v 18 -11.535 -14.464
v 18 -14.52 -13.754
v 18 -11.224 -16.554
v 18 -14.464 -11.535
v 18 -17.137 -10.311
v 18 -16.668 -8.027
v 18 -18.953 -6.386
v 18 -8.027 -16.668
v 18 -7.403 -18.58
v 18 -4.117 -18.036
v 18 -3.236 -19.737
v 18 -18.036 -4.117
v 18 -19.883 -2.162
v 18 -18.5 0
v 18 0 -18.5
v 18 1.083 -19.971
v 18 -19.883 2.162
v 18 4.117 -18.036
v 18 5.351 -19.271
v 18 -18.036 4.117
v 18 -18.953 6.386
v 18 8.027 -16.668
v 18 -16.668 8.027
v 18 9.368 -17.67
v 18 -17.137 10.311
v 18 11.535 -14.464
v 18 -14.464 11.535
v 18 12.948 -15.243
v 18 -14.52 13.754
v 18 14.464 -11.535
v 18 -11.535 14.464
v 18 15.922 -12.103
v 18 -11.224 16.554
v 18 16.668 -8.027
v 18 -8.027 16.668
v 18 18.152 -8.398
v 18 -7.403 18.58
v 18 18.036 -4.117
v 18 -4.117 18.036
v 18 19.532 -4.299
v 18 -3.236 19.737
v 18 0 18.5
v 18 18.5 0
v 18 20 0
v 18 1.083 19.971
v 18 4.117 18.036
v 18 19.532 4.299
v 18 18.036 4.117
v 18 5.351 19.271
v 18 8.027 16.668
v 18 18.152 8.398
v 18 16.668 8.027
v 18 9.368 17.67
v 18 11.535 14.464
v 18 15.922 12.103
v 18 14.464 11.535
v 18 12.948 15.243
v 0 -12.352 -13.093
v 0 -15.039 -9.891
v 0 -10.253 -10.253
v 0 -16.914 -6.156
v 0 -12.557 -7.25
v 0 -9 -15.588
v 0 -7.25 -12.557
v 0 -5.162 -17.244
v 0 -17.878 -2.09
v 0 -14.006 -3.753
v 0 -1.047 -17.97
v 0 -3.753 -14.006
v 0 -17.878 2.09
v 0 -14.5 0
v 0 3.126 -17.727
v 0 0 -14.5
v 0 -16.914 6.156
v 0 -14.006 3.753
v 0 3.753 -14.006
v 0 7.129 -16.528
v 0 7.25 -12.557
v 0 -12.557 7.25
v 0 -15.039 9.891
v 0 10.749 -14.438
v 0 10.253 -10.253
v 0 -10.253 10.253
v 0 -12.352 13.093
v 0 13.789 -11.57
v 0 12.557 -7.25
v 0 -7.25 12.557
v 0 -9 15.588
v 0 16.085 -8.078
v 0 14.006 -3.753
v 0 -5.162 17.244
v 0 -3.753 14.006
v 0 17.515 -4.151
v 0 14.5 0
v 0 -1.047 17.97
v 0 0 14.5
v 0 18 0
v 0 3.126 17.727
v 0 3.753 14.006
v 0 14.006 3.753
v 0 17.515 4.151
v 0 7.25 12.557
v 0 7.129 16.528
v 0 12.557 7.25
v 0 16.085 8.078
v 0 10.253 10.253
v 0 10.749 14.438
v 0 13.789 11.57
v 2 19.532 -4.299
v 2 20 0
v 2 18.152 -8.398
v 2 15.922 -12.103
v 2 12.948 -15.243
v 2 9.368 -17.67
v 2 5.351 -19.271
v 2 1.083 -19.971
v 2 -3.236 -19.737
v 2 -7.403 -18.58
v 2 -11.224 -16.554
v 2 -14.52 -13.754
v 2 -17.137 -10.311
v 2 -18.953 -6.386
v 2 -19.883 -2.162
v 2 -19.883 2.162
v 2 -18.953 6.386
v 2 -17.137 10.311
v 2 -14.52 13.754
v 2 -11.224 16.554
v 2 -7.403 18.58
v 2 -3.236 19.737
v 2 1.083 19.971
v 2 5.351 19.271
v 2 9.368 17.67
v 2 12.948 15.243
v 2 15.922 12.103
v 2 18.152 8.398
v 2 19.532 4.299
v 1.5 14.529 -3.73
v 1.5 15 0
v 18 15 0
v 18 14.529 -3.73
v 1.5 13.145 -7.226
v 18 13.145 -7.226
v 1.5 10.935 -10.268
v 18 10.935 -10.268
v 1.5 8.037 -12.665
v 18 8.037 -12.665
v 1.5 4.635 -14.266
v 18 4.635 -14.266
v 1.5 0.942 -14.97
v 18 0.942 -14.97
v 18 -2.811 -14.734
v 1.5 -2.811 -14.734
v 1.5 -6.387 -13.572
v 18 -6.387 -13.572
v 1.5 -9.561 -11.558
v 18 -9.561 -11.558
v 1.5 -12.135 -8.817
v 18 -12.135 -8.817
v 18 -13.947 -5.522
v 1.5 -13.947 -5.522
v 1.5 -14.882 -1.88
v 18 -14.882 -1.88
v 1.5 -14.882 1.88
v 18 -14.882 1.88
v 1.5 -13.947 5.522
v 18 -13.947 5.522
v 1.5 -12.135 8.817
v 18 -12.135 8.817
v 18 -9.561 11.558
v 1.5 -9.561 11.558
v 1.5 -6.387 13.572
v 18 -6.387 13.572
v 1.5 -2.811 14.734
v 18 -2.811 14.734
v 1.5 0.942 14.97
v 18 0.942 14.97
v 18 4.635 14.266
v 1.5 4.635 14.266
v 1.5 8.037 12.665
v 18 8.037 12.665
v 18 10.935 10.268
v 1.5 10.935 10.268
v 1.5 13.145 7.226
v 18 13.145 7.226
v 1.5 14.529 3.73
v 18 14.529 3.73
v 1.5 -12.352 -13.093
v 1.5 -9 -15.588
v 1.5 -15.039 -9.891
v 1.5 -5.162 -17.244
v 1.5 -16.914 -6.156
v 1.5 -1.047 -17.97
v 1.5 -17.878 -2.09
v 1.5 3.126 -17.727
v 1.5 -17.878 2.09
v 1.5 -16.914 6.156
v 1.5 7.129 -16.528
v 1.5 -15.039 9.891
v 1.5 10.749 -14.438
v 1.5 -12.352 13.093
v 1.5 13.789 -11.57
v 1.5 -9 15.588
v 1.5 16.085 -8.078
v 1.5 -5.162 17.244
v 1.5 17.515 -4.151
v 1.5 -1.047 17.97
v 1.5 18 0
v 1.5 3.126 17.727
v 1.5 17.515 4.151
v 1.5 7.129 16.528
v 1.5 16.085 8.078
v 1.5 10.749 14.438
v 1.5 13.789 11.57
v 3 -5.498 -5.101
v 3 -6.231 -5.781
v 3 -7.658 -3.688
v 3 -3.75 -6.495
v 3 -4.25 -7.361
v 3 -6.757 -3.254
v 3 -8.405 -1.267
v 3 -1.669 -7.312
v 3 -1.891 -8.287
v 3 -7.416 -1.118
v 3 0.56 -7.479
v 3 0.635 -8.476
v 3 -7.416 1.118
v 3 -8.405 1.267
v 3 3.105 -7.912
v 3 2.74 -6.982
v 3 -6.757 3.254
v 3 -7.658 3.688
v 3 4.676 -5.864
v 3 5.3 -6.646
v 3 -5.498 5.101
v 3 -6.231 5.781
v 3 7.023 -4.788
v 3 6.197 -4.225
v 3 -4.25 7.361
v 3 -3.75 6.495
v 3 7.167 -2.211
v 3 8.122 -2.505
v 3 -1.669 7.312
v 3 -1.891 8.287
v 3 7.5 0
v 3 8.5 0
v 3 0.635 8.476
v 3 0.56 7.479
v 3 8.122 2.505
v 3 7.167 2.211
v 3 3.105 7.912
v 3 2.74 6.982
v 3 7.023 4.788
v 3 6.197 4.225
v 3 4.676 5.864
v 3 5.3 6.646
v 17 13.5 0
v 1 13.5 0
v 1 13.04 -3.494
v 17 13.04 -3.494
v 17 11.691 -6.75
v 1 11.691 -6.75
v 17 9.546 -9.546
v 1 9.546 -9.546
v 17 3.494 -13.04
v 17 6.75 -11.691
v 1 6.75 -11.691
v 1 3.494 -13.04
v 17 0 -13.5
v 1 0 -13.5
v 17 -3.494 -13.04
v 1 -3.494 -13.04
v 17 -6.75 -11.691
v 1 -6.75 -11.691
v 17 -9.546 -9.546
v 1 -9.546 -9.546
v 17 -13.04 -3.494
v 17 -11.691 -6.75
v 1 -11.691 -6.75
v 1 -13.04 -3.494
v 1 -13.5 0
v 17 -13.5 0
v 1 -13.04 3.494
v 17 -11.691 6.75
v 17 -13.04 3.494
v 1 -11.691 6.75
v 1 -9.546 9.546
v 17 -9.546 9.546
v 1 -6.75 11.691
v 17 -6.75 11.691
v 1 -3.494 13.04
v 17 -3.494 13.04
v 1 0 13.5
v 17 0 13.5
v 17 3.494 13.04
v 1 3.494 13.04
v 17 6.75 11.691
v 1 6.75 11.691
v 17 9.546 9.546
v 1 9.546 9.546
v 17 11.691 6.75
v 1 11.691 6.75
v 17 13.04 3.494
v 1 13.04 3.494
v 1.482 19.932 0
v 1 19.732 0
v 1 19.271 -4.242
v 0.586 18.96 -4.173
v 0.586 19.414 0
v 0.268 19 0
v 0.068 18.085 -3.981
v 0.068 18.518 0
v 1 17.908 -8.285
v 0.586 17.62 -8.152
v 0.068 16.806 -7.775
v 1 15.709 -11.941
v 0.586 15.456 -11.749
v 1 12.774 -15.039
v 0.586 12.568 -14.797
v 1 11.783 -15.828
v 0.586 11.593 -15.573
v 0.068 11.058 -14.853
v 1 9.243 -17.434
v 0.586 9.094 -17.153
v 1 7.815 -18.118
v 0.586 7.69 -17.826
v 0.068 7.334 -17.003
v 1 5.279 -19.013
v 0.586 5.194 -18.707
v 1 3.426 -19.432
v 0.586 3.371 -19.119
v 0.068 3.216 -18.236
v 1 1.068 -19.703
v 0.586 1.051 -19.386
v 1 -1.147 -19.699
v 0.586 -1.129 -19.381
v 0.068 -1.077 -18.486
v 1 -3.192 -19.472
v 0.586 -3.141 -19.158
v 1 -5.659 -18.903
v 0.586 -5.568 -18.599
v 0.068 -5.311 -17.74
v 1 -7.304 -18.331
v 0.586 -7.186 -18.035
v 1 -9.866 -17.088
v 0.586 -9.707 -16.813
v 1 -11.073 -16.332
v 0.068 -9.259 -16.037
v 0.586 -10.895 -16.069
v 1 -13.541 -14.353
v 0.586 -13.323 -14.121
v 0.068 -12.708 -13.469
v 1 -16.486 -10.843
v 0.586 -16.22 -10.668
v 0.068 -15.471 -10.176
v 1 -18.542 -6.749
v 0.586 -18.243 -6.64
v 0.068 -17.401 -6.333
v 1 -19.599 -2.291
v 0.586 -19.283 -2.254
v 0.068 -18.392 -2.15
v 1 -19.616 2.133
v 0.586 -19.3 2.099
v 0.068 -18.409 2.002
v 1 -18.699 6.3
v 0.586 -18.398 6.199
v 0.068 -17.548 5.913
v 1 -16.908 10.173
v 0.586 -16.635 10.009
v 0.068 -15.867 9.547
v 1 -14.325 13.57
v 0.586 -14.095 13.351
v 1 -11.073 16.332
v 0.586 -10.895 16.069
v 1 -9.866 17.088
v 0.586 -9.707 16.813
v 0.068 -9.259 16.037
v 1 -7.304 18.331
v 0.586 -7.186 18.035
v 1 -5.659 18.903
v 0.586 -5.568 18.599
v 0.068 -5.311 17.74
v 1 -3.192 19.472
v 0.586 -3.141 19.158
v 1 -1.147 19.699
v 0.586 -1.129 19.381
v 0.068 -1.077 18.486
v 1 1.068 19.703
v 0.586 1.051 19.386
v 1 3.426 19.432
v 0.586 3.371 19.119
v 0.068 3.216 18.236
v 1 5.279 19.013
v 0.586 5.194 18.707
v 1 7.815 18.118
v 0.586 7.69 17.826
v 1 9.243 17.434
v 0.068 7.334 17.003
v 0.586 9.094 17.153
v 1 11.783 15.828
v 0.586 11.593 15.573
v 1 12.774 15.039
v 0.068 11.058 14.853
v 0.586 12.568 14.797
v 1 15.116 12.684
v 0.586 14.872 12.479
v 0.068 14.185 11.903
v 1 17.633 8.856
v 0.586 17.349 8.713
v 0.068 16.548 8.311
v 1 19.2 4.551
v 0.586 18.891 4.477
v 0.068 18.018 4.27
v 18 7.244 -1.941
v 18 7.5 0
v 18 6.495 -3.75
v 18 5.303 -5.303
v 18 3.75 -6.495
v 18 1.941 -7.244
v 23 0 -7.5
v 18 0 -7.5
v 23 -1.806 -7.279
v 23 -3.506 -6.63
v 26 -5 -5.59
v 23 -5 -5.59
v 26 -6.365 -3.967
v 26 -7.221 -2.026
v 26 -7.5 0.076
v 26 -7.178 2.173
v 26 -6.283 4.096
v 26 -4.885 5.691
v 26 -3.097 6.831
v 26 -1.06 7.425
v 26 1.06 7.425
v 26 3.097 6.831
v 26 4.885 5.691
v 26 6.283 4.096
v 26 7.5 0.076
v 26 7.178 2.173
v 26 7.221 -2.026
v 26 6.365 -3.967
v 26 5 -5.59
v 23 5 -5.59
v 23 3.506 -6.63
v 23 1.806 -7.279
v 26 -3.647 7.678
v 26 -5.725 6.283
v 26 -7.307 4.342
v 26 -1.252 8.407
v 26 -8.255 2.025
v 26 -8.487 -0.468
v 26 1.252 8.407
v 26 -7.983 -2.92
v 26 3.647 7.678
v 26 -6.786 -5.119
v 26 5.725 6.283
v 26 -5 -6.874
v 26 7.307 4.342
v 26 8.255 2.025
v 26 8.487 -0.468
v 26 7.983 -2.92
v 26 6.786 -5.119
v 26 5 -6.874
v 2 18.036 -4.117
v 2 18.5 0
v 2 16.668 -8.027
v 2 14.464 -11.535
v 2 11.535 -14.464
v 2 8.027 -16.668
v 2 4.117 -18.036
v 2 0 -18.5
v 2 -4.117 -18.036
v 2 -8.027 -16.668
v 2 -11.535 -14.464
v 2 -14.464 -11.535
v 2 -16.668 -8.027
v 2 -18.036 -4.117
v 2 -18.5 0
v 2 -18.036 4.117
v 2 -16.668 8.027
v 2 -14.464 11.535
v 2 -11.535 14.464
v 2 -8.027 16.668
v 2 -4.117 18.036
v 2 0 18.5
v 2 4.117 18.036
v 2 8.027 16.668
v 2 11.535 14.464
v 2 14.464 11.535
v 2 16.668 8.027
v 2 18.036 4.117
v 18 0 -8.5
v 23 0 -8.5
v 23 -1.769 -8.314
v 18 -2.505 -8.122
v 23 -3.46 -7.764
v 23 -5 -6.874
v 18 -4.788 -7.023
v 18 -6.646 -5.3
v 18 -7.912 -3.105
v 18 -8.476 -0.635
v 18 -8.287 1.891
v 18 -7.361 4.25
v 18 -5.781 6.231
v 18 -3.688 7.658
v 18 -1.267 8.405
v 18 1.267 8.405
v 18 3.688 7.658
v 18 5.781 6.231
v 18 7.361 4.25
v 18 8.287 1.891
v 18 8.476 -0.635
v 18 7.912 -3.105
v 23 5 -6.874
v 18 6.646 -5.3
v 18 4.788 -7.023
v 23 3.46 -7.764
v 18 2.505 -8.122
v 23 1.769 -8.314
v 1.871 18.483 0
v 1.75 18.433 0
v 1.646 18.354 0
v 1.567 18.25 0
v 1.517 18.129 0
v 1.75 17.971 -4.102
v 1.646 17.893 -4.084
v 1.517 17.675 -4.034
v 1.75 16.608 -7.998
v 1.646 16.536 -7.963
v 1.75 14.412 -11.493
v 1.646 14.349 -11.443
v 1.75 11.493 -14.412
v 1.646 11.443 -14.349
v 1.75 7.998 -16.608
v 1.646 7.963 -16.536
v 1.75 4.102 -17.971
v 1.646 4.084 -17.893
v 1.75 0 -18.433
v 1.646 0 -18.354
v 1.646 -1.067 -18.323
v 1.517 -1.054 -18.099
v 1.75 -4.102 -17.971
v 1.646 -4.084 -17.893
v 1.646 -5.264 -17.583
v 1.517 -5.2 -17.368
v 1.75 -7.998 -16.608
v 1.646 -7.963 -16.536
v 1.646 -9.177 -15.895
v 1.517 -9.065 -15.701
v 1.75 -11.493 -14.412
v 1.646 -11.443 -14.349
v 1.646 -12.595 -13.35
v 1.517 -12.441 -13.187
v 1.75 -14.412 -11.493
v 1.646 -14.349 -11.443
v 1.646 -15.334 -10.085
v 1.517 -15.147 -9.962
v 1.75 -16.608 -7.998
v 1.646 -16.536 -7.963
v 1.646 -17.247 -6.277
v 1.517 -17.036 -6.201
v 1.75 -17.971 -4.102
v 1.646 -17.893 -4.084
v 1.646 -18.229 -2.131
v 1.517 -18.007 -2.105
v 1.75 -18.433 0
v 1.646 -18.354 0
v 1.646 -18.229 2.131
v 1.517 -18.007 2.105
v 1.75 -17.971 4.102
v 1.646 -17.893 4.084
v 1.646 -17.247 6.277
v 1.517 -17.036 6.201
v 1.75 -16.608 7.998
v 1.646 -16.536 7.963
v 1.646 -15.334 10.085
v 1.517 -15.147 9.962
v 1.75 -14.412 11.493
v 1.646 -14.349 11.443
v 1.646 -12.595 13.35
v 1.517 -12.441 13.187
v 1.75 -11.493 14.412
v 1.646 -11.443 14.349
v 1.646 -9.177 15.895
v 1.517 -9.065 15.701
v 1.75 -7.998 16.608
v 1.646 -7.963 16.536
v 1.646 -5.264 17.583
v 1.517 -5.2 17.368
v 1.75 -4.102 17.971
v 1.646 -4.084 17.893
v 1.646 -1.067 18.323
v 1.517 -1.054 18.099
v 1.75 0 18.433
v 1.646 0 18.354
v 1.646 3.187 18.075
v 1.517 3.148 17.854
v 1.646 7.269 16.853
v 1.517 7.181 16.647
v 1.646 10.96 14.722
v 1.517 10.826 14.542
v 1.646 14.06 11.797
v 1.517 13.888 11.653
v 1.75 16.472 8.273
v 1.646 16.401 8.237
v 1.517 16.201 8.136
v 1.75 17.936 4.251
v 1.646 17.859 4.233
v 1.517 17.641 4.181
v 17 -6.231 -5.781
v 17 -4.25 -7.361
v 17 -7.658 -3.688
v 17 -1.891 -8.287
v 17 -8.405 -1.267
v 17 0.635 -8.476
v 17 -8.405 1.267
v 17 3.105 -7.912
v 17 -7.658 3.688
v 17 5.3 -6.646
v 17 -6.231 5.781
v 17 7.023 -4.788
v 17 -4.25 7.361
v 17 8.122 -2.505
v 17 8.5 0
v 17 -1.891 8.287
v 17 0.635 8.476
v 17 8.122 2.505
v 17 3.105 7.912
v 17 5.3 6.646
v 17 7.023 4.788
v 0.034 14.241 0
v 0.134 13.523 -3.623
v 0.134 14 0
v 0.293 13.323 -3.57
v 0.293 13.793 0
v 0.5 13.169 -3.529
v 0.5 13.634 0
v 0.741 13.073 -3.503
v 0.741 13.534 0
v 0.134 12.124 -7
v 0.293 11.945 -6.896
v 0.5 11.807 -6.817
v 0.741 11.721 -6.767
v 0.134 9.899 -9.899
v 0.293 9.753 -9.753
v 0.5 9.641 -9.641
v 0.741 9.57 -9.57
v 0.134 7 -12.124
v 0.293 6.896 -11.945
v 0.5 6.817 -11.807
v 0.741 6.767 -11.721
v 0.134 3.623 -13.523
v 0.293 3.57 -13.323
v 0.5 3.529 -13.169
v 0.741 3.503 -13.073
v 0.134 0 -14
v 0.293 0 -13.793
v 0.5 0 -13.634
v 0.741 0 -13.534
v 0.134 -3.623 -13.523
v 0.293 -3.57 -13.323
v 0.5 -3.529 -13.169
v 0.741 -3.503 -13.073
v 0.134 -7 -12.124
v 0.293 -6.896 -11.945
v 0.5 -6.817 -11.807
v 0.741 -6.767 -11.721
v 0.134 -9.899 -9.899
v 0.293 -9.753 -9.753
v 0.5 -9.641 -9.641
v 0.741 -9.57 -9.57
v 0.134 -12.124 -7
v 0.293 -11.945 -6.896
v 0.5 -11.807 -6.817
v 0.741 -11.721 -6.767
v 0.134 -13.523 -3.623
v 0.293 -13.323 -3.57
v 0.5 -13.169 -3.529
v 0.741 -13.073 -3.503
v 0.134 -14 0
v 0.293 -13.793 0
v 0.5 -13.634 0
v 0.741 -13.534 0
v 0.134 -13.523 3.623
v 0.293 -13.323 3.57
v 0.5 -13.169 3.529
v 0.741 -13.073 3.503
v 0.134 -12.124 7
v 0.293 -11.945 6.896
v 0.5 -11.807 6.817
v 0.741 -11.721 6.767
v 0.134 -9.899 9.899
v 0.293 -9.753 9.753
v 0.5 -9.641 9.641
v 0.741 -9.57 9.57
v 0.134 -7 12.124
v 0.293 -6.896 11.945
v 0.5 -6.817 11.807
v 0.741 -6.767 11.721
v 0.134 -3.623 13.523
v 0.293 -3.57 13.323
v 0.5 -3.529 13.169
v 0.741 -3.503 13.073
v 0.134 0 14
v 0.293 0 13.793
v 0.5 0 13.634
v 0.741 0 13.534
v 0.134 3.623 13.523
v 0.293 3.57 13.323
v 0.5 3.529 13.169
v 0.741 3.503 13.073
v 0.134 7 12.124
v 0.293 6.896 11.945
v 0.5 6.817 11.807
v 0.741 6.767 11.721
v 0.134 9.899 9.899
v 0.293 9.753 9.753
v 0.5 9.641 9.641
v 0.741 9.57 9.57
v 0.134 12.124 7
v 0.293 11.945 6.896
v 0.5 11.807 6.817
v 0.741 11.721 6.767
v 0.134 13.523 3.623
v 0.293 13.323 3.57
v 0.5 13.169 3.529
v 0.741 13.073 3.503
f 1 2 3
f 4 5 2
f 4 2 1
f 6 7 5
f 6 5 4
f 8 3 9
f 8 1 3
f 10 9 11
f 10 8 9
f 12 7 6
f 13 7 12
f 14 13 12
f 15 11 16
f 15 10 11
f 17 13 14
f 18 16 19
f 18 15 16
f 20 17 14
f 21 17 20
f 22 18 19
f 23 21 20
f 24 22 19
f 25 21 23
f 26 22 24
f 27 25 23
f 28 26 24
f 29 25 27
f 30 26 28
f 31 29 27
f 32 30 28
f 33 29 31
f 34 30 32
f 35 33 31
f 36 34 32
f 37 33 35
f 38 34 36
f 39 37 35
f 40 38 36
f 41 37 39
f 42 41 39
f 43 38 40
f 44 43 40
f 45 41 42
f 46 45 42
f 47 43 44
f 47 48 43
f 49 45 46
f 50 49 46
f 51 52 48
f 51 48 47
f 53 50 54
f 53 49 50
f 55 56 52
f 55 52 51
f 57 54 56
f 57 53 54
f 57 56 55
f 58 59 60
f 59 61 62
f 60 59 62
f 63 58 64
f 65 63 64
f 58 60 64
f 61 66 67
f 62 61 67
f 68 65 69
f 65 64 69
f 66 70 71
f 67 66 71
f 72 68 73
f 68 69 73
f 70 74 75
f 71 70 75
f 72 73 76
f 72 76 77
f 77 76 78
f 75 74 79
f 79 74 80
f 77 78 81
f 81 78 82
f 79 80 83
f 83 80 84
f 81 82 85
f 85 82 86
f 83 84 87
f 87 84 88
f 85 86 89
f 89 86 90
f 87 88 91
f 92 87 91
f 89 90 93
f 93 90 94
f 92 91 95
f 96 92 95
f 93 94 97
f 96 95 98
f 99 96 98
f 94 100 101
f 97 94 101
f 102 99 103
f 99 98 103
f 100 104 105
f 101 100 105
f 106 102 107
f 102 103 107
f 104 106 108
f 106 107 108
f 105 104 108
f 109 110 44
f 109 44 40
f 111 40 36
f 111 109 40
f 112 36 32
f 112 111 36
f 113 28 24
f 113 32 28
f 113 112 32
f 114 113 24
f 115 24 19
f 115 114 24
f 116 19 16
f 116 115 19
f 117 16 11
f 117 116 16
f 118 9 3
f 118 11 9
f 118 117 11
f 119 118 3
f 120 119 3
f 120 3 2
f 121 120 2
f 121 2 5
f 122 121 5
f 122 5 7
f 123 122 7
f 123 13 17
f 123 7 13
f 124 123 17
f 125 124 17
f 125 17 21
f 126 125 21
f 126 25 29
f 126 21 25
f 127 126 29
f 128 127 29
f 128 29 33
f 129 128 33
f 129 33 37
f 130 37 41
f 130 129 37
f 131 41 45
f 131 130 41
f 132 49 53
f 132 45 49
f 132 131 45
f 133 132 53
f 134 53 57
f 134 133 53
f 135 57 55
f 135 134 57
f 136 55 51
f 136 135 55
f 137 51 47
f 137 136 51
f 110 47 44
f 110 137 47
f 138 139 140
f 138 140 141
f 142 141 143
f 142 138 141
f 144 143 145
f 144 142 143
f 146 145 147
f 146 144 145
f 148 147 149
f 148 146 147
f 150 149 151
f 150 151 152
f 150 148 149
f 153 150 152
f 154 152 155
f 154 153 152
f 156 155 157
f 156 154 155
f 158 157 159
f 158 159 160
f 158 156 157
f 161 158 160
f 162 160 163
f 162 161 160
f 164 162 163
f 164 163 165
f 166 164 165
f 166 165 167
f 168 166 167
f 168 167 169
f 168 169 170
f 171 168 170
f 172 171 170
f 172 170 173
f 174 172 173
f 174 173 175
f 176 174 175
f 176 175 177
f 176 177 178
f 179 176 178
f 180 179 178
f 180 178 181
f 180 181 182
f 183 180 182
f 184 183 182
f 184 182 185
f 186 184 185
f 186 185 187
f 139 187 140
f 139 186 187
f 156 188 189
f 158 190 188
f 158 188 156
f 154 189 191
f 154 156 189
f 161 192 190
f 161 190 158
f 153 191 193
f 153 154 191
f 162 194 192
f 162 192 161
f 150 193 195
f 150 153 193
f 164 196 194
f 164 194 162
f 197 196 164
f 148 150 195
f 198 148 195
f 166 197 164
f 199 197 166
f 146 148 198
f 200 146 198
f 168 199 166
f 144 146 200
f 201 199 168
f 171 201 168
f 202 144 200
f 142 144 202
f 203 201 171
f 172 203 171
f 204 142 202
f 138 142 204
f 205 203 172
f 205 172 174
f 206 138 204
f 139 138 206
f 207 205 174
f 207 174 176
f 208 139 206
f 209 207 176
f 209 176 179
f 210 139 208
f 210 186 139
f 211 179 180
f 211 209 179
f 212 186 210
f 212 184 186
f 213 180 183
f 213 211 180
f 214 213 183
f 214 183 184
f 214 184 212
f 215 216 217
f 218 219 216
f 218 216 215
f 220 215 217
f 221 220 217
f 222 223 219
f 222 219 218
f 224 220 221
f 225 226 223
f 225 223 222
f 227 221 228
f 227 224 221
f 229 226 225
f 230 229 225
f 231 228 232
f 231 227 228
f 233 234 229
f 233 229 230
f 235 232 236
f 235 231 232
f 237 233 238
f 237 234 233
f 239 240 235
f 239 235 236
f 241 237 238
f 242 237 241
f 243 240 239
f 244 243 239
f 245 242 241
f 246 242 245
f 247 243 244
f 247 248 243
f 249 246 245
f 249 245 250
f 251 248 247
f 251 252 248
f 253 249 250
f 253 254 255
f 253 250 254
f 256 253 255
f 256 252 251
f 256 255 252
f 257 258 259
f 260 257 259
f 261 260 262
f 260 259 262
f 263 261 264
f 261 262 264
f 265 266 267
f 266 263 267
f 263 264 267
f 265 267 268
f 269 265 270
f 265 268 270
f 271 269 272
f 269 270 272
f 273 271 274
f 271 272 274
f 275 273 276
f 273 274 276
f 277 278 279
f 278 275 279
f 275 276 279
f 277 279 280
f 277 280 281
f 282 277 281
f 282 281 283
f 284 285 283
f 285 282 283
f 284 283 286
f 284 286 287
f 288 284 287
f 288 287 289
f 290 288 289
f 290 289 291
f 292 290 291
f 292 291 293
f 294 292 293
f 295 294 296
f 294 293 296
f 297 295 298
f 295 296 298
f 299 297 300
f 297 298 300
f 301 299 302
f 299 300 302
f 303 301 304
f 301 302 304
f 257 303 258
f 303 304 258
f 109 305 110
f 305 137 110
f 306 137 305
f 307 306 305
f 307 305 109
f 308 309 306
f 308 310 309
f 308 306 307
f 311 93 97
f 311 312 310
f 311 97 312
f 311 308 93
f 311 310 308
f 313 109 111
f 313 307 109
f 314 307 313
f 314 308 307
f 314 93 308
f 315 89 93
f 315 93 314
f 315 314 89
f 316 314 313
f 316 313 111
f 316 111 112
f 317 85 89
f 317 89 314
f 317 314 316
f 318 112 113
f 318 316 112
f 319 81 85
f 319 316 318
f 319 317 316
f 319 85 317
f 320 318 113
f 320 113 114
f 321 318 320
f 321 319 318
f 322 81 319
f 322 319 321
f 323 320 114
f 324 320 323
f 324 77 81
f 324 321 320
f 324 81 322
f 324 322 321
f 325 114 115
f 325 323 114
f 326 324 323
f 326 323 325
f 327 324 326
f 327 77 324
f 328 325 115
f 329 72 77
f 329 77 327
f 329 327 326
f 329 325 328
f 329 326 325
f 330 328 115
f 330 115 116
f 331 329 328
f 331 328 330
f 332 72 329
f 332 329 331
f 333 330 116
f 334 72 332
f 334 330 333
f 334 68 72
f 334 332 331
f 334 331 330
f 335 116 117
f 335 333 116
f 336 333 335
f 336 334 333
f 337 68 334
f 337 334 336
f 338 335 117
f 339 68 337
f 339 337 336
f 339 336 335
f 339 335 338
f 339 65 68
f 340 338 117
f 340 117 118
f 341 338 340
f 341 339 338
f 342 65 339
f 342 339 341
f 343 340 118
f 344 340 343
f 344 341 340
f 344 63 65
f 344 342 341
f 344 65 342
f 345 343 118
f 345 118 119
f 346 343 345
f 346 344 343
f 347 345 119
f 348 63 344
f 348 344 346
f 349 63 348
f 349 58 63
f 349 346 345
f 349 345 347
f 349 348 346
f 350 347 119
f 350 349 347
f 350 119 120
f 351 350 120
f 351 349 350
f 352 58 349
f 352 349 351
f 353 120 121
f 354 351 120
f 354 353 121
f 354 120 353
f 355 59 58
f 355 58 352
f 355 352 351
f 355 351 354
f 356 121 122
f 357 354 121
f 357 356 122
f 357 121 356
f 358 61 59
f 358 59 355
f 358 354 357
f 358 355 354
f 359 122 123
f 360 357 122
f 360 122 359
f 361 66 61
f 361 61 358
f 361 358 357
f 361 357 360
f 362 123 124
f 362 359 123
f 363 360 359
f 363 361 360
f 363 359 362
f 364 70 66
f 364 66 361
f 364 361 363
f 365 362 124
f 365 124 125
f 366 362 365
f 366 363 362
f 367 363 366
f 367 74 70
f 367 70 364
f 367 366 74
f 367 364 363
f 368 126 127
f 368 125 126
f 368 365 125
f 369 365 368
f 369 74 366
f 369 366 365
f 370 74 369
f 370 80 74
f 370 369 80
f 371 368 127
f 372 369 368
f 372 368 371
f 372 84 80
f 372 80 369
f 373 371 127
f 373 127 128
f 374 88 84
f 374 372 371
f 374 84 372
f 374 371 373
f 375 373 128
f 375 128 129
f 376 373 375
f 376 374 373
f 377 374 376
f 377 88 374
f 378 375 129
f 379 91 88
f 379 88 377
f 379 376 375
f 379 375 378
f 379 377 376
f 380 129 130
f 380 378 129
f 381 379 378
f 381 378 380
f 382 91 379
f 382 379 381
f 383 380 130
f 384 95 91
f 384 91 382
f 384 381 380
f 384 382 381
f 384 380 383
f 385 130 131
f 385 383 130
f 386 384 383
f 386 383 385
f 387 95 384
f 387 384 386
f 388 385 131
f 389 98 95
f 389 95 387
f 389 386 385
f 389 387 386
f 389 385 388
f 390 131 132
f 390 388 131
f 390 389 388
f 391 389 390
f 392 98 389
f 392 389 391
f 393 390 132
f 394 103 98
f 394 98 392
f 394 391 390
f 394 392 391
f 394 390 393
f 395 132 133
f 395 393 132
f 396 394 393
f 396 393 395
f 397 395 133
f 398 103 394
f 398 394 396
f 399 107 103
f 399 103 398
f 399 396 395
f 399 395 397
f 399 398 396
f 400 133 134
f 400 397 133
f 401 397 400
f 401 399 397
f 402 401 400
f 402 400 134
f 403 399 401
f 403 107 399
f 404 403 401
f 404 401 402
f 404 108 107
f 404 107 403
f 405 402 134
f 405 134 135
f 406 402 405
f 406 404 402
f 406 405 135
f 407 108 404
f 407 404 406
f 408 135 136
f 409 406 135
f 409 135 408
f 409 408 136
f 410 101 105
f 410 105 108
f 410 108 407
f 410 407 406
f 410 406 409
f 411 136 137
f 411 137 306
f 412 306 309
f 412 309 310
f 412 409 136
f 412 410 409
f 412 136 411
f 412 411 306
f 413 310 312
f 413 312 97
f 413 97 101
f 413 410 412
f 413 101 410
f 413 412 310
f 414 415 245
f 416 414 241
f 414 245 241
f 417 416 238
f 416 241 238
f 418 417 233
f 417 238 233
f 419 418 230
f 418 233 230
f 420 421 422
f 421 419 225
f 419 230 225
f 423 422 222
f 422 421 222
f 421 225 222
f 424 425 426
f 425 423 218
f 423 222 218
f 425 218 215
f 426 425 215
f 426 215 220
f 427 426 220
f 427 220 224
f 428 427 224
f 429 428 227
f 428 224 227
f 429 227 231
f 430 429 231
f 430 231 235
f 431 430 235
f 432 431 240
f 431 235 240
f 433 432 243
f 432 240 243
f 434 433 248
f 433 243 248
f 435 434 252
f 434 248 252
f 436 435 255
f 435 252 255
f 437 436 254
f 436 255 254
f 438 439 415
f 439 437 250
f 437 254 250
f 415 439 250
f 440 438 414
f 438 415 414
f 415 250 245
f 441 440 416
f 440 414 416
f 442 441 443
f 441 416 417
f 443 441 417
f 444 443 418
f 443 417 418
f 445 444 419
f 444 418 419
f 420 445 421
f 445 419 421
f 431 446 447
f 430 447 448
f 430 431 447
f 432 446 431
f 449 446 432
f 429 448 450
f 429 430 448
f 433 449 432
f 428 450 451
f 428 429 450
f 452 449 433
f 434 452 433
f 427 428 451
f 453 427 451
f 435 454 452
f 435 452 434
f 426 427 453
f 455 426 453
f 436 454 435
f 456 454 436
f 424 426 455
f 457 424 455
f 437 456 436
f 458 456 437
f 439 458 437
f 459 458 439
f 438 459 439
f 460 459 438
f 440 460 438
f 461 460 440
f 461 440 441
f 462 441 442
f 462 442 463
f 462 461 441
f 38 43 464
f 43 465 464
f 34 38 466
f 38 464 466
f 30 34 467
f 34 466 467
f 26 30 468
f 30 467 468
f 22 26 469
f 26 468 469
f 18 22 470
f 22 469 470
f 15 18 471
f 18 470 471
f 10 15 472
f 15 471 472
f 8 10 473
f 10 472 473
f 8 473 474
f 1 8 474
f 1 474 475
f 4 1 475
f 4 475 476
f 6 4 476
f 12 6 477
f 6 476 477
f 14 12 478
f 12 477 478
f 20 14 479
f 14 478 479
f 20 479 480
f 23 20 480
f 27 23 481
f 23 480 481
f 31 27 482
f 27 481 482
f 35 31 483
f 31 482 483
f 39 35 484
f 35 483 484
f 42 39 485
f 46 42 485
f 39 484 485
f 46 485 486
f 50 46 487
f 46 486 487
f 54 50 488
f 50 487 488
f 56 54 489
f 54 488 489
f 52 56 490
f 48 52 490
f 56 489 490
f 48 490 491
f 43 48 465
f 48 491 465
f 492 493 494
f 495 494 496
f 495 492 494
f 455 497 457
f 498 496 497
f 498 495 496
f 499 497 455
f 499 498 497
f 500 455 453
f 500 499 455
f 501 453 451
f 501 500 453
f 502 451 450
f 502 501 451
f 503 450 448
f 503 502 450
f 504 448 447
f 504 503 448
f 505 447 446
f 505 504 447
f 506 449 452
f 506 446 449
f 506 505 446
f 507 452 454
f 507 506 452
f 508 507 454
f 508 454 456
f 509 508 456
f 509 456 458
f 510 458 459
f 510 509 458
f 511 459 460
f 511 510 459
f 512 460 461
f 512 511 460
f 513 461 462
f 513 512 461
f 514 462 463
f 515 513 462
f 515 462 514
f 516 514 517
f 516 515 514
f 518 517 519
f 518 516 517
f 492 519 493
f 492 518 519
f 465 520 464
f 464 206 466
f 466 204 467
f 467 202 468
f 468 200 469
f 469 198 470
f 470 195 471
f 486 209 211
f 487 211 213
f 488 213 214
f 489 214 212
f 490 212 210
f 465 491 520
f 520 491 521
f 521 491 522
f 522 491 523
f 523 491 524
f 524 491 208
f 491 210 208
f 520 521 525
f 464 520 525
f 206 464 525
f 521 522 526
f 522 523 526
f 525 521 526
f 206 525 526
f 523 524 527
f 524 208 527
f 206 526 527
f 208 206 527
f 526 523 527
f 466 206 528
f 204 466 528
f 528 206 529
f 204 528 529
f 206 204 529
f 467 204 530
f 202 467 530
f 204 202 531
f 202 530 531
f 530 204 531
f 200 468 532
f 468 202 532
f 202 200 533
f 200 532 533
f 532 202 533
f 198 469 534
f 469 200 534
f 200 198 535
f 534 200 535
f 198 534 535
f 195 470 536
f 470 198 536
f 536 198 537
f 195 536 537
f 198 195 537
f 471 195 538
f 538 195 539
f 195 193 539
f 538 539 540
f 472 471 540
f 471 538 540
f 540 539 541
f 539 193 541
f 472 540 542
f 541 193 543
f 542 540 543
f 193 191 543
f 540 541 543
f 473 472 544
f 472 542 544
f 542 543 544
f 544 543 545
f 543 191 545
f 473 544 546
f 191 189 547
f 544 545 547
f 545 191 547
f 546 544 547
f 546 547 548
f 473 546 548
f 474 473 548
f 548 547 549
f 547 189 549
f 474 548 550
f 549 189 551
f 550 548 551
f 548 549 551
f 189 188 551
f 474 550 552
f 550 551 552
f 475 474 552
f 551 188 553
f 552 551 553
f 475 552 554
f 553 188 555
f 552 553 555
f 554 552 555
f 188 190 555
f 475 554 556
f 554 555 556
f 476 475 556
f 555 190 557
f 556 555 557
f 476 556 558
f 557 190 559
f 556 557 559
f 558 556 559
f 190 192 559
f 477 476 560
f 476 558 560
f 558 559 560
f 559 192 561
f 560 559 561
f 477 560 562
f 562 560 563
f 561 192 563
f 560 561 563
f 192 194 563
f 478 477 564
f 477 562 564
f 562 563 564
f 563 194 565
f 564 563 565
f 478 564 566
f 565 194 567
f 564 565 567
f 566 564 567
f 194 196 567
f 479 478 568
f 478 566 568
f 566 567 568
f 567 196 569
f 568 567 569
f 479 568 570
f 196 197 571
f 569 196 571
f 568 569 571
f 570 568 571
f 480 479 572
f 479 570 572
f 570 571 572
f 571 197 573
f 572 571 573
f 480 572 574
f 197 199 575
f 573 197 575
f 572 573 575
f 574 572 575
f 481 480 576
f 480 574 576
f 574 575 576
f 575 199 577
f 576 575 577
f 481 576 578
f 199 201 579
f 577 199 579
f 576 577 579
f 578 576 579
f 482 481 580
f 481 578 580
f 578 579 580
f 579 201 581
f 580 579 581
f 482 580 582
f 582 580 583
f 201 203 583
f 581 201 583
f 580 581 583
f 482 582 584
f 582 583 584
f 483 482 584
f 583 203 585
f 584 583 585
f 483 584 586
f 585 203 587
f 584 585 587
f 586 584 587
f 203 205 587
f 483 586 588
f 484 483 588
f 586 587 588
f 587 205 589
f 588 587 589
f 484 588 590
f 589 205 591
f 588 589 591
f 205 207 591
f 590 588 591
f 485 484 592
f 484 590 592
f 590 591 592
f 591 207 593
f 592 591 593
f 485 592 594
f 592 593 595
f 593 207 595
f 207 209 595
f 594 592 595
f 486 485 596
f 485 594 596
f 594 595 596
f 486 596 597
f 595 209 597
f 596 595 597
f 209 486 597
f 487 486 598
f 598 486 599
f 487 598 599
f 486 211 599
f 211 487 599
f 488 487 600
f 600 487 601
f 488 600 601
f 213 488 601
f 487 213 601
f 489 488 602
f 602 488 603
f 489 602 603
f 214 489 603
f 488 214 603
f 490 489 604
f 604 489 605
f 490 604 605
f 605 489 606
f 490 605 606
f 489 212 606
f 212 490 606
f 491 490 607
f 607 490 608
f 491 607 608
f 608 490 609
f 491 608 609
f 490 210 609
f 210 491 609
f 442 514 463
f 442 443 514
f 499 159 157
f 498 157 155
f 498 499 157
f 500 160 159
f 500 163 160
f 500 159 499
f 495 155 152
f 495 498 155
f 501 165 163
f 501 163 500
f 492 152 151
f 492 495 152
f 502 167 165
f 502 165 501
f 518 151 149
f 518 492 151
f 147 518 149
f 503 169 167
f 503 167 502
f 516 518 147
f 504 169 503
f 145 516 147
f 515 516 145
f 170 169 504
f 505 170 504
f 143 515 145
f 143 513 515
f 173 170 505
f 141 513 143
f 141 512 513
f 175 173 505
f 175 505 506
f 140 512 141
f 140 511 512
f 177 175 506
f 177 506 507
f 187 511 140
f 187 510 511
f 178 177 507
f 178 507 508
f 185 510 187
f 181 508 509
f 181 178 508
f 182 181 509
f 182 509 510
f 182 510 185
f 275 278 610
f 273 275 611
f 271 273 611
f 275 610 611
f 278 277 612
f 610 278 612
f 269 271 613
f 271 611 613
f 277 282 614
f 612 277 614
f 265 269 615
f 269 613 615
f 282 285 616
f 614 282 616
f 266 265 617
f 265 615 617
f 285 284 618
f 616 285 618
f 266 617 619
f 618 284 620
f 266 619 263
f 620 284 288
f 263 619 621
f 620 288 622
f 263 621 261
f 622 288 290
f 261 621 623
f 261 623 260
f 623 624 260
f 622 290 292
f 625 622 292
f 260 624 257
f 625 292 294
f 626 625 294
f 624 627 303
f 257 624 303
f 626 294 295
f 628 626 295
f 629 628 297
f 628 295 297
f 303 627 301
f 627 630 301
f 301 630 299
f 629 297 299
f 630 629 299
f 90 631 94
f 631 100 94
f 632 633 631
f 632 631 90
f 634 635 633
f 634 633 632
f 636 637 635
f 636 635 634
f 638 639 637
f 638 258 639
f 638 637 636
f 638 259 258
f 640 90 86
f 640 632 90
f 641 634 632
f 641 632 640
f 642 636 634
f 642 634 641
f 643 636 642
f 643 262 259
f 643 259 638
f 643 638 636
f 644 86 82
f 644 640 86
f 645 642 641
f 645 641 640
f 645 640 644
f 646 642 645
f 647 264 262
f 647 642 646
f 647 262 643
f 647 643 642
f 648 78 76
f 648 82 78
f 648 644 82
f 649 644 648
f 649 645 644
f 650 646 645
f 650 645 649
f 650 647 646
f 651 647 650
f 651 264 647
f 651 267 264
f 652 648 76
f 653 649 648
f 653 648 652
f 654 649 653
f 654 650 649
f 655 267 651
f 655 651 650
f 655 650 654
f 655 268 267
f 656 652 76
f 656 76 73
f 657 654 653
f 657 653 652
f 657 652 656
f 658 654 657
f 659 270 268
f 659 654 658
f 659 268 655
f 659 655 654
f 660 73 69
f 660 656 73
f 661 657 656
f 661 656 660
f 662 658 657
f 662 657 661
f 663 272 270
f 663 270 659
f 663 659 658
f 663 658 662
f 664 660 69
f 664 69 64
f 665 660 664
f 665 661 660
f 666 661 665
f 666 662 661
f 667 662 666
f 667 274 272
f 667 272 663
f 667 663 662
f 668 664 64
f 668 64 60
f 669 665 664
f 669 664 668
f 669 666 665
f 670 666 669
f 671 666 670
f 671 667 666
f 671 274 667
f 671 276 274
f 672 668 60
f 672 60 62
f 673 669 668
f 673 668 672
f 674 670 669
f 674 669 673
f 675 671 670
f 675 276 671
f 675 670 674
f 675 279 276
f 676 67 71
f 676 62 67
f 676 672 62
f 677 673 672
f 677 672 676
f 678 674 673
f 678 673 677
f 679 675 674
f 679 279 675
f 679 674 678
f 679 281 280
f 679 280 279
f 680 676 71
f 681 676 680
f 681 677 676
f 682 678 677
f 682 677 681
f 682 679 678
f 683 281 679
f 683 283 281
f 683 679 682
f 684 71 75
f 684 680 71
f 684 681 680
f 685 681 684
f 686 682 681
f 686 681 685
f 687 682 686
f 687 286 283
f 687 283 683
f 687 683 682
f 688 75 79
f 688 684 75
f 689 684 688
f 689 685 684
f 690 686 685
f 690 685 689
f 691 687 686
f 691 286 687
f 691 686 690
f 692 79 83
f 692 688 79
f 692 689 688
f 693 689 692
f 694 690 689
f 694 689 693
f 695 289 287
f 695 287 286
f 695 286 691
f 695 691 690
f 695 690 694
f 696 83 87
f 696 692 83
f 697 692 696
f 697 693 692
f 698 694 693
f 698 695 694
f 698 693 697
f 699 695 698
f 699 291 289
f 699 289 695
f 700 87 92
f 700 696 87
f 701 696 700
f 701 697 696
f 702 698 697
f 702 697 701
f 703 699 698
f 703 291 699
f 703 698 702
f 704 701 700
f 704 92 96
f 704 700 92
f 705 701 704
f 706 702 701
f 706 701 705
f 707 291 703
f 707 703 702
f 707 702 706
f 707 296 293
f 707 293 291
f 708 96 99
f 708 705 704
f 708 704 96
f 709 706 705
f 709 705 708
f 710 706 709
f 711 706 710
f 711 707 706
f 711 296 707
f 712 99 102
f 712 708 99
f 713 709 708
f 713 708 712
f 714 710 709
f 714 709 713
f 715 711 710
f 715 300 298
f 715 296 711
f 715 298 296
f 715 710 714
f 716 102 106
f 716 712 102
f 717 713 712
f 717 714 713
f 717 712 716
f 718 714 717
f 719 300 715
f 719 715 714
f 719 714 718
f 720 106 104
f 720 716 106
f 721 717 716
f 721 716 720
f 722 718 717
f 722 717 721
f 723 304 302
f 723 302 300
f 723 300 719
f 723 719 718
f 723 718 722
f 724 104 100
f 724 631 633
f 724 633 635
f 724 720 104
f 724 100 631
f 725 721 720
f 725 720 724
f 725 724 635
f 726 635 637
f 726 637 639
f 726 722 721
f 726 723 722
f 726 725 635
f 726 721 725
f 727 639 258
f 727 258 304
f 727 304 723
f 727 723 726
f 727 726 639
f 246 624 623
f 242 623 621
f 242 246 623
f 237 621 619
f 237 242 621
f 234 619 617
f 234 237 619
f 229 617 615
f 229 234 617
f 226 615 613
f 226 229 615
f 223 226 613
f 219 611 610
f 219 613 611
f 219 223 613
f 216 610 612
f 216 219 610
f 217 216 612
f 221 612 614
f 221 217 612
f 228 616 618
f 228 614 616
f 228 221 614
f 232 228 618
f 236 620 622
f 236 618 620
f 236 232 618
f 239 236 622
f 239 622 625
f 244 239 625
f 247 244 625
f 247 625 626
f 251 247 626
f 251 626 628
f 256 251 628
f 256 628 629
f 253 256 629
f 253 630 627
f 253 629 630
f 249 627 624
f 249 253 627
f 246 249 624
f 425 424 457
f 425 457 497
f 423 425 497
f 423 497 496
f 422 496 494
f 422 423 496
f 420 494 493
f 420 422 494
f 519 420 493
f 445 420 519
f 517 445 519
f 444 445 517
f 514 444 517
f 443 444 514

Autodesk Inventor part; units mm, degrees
ref_plane "XZ Plane" through (0, 0, 0) normal (0, 1, 0) x (-1, 0, 0)
ref_plane "XY Plane" through (0, 0, 0) normal (0, 0, 1) x (1, 0, 0)
ref_plane "Work Plane1" through (20, 0, 0) normal (1, 0, 0) x (0, 1, 0)
sketch "Sketch7" plane through (0, 0, 0) normal (1, 0, 0) x (0, 1, 0)
  circle A0 centre (0, 0) radius 7.5
  circle A1 centre (0, 0) radius 20
  dimension "d28" = 15
  dimension "d29" = 40
extrude "Wheel" add sketch "Sketch7" along normal blind 18
sketch "Sketch8" plane through (0, 0, 0) normal (1, 0, 0) x (0, 1, 0)
  circle A0 centre (0, 0) radius 8.5
  circle A1 centre (0, 0) radius 13.5
  dimension "d32" = 17
  dimension "d33" = 27
extrude "Extrusion7" cut sketch "Sketch8" along normal blind 17
sketch "Sketch9" plane through (0, 0, 0) normal (-1, 0, 0) x (0, 0, 1)
  circle A0 centre (0, 0) radius 11.0642
extrude "Extrusion8" cut sketch "Sketch9" against normal blind 3
fillet "Fillet1" radius 2 1 edges at (0, -20, 0)
fillet "Fillet2" radius 1 1 edges at (0, -13.5, 0)
shell "Shell1" thickness 1.5 removed faces 1 at (18, 15.6396, -1.5954)
sketch "Sketch10" plane through (18, 0, 0) normal (1, 0, 0) x (0, 0, -1)
  circle A0 centre (0, 0) radius 8.5
  circle A1 centre (0, 0) radius 7.5 projected
  dimension "d41" = 17
extrude "Extrusion9" add sketch "Sketch10" along normal blind 8
sketch "Sketch11" plane through (0, 0, 0) normal (0, 0, 1) x (1, 0, 0)
  line L0 (26, -8.5) -> (26, 8.5) projected
  line L1 (18, 8.5) -> (18, -8.5) projected
  line L2 (26, 7.5) -> (26, -7.5) projected
  line L3 (26, -5) -> (23, -5)
  line L4 (23, -5) -> (23, 5)
  line L5 (23, 5) -> (26, 5)
  line L6 (26, 5) -> (26, -5)
  line L7 (0, 0) -> (9.4673, 0) construction
  dimension "d44" = 3
  dimension "d45" = 10
  dimension "d46" = 5
extrude "Extrusion10" cut sketch "Sketch11" against normal blind 20
equation "\"d46\" = 0.5 * d45"
properties part number "RearWheelLeft"
